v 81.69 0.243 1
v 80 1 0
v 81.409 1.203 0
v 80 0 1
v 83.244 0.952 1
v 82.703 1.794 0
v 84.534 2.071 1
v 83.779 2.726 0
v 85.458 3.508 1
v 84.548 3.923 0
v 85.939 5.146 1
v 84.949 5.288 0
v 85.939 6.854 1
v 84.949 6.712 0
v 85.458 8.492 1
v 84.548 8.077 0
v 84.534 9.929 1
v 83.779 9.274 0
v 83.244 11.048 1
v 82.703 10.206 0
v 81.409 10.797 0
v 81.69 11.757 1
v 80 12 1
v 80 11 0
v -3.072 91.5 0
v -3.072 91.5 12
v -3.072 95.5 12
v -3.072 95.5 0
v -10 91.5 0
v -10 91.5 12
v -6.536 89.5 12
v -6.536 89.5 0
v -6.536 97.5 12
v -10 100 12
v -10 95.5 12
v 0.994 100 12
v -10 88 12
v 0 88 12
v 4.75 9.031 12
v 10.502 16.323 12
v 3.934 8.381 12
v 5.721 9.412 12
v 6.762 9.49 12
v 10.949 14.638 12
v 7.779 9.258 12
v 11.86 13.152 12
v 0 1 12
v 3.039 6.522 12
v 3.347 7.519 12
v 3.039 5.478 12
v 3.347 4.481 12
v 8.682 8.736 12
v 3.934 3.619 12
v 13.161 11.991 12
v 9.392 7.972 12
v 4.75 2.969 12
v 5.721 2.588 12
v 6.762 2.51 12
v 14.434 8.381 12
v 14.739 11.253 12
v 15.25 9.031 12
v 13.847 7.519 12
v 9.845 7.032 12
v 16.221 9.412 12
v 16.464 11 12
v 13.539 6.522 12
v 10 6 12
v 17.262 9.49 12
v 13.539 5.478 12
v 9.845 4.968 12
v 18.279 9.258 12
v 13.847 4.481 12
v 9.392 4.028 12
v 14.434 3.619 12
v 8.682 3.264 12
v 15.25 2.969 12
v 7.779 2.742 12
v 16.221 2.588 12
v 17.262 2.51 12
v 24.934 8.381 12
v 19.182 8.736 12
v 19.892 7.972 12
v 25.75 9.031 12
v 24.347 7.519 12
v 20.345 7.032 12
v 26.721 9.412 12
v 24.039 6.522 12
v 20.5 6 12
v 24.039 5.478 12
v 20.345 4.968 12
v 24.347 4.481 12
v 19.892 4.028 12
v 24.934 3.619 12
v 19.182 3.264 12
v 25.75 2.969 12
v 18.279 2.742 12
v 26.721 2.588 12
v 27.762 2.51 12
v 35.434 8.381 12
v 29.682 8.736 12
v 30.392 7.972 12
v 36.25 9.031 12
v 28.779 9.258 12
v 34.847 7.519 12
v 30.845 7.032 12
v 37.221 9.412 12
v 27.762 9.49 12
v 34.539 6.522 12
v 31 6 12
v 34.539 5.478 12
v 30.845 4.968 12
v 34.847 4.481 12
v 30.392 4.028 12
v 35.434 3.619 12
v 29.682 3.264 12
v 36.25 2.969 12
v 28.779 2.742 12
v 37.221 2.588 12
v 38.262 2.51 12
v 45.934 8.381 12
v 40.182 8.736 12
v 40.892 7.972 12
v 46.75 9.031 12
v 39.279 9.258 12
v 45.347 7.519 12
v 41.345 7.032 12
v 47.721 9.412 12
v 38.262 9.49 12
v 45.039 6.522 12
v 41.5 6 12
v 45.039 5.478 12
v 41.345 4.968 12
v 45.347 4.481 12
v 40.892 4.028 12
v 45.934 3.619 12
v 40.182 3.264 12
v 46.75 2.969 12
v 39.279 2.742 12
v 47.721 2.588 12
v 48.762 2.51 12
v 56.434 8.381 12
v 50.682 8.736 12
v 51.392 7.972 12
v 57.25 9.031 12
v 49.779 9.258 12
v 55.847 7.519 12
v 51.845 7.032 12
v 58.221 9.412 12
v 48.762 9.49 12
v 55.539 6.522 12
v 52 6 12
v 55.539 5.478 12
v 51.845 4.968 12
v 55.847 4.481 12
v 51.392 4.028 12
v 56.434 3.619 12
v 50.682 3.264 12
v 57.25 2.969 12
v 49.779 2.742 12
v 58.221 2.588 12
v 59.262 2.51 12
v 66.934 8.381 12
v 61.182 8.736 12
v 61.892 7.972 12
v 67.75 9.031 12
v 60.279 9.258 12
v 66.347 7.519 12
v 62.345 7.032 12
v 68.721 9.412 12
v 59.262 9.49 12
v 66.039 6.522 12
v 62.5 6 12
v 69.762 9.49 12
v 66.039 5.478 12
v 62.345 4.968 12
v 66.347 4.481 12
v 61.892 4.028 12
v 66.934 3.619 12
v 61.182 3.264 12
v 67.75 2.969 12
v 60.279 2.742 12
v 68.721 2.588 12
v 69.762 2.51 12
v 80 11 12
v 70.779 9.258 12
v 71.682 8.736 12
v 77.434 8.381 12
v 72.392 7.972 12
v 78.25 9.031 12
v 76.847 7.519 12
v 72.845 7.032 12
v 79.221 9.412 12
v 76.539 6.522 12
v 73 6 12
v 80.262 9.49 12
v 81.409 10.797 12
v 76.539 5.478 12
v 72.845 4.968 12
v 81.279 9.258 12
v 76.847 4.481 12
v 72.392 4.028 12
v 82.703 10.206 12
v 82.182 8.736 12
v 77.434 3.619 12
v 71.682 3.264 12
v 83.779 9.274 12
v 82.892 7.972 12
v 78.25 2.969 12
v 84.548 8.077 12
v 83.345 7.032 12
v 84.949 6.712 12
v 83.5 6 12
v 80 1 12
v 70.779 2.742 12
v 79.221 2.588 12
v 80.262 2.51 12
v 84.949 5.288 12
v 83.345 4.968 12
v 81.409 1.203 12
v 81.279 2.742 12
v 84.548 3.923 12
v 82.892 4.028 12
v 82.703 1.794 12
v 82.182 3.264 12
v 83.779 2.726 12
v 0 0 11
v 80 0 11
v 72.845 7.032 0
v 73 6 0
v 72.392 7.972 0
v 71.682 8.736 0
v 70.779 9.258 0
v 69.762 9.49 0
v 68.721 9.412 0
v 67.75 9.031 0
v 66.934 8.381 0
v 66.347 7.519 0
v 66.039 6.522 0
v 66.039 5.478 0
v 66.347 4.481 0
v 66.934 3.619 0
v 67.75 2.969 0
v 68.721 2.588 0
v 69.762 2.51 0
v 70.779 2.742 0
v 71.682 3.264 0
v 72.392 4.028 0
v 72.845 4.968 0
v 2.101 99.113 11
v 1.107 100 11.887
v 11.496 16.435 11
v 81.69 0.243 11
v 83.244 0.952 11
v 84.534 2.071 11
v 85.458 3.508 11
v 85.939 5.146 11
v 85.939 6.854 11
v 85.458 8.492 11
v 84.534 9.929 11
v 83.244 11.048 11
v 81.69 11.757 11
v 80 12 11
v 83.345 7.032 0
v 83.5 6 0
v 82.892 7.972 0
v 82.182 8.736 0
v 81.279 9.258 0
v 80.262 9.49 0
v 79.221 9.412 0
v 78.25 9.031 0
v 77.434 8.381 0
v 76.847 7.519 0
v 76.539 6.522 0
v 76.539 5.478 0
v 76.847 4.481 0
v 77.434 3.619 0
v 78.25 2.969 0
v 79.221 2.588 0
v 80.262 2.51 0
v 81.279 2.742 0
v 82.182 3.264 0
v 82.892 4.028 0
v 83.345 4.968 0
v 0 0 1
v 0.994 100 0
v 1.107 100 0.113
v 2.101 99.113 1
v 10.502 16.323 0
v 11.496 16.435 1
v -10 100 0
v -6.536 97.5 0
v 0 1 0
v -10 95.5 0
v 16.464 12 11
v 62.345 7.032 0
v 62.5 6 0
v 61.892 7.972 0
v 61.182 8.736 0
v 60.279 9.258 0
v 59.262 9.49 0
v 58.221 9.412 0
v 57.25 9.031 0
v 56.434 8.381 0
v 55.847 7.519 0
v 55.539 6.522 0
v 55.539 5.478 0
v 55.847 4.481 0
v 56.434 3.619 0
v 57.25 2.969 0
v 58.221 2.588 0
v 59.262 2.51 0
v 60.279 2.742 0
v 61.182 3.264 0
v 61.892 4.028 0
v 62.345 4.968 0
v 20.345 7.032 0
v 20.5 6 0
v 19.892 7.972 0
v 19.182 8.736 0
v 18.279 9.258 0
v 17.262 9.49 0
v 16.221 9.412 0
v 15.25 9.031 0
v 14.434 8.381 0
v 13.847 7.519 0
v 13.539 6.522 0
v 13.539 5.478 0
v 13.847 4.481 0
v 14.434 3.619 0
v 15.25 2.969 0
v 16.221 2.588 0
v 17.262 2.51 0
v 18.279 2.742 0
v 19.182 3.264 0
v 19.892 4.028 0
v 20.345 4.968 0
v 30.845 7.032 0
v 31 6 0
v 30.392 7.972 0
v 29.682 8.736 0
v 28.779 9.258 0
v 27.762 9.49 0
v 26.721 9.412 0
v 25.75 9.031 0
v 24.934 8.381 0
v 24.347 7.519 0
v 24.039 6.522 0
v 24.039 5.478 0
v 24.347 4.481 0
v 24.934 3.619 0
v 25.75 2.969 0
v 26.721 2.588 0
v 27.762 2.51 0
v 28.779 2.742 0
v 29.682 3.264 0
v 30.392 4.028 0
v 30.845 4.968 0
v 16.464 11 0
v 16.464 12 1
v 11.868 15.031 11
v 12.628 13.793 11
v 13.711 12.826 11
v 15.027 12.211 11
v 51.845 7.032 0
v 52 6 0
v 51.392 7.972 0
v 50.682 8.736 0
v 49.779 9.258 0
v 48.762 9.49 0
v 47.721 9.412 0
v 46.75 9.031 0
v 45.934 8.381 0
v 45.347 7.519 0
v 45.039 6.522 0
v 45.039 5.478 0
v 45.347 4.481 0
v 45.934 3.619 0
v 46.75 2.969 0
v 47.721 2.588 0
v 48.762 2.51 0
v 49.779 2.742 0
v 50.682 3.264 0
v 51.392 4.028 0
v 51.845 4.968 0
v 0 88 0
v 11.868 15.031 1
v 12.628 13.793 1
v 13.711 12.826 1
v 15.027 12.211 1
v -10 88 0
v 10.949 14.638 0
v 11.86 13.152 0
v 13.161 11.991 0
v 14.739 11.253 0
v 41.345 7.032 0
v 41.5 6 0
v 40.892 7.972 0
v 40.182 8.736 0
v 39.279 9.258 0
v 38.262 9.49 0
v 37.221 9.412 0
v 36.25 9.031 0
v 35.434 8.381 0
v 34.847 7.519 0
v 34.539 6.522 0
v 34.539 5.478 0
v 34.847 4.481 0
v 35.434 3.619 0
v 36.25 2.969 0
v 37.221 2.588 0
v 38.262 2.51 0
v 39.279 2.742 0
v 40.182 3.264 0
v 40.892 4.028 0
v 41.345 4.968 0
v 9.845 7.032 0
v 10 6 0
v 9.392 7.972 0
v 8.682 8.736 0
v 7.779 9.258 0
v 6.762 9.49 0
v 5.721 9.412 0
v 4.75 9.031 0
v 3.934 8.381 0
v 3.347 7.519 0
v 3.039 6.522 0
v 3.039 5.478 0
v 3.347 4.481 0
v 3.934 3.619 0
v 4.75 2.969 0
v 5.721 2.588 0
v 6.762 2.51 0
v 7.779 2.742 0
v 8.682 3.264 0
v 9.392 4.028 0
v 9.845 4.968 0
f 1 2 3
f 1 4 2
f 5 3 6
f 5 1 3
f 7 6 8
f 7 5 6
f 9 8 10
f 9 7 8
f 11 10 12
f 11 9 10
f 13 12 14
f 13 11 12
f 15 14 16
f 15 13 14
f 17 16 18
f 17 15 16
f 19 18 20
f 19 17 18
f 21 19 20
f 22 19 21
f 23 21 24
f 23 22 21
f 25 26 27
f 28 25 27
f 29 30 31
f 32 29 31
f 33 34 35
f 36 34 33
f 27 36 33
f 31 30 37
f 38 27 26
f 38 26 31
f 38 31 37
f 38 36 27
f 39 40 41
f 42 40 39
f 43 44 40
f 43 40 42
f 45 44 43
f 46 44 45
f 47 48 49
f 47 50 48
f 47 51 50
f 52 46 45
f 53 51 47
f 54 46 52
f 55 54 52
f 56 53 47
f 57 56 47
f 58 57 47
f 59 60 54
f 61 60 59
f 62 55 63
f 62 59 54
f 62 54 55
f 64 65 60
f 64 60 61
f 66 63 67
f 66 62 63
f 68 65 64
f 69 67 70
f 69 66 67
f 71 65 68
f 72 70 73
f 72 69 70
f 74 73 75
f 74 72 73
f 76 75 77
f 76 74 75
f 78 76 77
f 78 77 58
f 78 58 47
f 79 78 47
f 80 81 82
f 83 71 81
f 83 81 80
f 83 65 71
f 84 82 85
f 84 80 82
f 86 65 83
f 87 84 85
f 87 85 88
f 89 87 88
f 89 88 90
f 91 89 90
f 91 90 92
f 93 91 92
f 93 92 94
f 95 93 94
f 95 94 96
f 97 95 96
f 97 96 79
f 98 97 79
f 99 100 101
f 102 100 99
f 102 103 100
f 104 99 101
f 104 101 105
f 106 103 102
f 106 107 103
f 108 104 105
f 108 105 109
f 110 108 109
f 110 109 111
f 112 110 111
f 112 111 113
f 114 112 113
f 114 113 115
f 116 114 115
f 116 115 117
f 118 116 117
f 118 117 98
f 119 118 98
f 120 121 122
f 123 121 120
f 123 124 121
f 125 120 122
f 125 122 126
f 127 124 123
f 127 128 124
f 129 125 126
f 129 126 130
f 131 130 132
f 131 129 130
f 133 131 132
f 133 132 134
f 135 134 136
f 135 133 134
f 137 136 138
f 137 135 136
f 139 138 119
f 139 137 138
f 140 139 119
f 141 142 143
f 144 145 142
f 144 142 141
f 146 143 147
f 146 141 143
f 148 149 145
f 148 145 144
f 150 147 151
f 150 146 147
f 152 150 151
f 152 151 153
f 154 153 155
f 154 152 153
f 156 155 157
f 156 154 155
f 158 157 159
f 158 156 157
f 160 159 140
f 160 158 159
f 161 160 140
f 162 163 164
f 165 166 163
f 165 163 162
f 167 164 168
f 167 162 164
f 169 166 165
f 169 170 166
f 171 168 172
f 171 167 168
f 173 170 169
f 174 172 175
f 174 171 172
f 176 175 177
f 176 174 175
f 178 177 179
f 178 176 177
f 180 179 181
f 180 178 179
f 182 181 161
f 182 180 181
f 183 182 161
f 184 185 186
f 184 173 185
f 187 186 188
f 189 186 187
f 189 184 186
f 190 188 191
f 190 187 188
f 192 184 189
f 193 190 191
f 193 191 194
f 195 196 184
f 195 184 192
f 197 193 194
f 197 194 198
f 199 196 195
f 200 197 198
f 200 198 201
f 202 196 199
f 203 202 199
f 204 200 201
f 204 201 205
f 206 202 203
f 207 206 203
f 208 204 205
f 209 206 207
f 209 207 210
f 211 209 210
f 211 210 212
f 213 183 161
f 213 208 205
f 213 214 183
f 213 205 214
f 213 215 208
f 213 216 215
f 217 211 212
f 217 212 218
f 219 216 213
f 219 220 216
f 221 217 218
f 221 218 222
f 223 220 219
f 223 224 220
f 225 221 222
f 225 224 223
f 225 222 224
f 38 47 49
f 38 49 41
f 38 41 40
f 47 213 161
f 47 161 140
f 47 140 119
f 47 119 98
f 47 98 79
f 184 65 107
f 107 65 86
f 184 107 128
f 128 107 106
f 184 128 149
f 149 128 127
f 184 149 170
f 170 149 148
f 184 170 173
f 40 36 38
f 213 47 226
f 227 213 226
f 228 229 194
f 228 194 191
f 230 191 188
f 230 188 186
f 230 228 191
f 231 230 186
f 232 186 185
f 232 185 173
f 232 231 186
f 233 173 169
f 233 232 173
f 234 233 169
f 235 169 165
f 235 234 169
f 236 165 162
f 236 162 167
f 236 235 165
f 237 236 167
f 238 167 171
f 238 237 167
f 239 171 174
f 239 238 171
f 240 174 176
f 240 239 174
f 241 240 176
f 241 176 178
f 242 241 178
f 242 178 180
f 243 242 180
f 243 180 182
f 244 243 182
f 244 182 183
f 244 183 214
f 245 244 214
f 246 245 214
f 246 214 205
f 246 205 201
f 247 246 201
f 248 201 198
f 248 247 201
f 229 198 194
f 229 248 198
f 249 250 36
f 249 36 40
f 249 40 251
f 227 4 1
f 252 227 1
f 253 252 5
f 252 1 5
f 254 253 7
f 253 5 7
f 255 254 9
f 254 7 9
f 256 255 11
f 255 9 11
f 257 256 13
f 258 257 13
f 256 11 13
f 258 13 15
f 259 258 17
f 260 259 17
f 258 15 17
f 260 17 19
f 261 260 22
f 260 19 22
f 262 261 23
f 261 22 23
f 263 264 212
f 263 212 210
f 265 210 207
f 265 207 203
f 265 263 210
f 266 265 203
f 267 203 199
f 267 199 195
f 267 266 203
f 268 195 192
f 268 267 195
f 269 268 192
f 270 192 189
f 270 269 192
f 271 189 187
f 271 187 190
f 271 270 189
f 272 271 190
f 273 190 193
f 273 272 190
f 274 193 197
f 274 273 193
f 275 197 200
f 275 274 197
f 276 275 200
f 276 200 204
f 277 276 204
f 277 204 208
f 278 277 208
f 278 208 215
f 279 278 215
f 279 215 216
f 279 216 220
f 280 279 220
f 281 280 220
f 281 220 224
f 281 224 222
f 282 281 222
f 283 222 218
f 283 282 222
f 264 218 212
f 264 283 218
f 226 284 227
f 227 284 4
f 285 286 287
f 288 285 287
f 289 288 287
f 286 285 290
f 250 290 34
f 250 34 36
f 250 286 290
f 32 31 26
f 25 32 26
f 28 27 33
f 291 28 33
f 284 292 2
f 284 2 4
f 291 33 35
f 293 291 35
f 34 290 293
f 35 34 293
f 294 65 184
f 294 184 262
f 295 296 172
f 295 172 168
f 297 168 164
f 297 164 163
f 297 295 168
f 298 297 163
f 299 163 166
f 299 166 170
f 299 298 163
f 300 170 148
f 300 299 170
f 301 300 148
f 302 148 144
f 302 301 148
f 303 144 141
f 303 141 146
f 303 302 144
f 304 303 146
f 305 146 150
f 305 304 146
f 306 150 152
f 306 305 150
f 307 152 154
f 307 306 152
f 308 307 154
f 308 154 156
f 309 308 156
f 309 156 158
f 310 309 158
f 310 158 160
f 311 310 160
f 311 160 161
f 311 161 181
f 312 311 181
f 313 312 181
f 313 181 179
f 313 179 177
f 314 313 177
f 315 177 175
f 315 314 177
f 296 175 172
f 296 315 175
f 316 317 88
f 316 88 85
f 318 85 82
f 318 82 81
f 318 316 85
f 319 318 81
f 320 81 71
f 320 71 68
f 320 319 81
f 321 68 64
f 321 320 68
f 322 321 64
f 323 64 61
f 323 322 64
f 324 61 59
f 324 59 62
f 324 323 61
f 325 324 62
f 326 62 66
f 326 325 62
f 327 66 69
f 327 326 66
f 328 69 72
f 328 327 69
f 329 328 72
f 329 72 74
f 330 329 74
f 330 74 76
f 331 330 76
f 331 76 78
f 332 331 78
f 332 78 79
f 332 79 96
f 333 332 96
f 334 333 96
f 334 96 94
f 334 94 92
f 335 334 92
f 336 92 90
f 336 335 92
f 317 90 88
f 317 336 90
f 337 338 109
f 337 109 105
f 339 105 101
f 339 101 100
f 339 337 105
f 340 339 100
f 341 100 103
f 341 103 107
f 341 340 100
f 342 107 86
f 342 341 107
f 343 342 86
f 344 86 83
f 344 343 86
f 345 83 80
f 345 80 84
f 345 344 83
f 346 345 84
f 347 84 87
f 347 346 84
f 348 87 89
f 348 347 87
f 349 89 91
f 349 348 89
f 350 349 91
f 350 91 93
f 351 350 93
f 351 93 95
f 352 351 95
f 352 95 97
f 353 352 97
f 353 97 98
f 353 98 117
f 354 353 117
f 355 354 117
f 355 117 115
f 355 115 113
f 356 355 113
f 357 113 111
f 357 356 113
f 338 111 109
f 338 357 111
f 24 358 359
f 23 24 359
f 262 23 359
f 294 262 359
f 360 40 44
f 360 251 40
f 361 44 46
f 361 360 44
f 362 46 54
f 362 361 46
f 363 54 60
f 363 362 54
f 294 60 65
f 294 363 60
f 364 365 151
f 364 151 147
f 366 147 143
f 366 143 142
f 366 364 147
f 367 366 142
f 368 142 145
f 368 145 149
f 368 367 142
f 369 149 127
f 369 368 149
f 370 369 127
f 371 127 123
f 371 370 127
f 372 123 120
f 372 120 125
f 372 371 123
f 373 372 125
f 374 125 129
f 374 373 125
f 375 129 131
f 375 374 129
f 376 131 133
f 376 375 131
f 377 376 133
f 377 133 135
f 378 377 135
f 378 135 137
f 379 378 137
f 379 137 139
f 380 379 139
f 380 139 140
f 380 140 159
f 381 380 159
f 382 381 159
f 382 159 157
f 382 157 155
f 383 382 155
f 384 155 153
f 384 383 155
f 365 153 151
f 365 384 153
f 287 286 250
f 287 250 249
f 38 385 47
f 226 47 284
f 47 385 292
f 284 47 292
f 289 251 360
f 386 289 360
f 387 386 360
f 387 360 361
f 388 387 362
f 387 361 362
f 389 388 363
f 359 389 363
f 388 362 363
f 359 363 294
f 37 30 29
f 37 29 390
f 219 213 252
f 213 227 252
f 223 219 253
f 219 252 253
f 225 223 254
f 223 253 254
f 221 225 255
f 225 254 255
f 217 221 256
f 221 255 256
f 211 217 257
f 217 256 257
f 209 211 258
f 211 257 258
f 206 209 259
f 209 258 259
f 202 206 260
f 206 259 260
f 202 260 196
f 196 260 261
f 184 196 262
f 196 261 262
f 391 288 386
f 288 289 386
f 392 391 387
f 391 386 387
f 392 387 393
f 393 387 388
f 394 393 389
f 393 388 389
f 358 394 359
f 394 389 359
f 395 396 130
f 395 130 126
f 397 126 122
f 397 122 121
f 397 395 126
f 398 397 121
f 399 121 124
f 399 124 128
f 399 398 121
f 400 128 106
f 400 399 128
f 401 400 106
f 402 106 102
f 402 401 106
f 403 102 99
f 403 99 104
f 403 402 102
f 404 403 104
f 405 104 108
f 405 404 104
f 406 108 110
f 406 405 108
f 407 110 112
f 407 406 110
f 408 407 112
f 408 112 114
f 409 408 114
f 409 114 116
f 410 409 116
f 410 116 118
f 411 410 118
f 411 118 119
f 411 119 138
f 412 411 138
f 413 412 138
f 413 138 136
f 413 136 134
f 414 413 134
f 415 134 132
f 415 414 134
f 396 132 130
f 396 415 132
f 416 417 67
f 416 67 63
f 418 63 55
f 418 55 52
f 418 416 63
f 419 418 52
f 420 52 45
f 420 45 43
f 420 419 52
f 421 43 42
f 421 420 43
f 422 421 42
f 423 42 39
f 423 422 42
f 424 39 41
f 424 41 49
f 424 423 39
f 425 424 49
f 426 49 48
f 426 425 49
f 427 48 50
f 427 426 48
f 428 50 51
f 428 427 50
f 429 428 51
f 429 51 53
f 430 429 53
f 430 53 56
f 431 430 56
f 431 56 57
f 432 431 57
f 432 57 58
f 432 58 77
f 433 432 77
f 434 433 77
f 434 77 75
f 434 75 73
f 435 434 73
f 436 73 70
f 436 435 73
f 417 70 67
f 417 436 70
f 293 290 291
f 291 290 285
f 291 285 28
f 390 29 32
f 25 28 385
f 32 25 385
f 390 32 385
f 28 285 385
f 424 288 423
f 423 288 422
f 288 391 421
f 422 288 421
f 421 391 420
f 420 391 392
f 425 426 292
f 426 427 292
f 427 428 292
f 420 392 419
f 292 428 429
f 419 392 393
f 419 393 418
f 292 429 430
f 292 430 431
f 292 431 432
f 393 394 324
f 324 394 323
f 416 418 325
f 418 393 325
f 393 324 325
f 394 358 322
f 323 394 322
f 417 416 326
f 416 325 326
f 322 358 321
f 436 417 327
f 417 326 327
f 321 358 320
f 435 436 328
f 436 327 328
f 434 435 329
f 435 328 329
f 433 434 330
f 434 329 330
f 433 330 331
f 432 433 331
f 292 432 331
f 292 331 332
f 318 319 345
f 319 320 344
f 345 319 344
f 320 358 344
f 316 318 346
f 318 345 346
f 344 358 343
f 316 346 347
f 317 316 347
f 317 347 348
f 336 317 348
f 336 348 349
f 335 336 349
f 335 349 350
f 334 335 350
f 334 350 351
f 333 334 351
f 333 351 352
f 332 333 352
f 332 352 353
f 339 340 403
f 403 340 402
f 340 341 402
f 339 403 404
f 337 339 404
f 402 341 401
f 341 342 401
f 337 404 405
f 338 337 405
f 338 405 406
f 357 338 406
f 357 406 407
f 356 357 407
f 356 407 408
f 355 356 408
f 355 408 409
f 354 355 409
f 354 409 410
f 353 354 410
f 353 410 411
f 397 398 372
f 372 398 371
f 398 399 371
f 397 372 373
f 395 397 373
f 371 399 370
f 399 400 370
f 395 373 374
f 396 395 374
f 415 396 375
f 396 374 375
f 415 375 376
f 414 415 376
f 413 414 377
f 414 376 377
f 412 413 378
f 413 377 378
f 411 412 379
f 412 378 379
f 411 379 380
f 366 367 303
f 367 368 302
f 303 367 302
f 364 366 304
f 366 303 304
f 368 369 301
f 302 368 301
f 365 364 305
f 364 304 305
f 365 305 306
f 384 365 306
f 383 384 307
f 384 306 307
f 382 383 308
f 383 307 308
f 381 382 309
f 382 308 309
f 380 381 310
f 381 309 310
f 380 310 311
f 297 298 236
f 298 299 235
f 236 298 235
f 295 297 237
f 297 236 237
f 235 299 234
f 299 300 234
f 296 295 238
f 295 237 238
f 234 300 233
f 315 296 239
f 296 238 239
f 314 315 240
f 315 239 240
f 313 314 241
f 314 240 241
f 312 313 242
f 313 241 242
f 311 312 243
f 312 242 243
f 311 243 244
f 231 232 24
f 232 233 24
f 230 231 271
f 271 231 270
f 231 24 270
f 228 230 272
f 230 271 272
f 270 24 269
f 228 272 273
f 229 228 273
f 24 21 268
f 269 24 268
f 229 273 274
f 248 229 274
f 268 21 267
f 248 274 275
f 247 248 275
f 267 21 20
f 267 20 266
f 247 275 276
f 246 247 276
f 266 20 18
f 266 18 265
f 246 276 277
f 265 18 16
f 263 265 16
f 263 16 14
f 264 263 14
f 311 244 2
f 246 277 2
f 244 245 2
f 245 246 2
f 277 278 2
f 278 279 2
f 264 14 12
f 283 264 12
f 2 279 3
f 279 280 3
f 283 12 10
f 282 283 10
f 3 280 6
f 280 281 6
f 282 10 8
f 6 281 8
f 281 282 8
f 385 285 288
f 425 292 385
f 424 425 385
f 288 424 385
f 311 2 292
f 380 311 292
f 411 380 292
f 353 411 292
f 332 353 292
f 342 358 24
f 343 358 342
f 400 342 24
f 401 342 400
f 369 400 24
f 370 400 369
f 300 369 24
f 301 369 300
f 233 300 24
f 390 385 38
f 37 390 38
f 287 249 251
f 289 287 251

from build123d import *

# Parameters (mm, degrees)
F0_R         = 3.5
F1_DEPTH     = 12
F3_DEPTH     = 25
F4_R         = 5
F5_W         = 12
F5_H         = 12
F6_DEPTH     = 10
F8_T1_DEPTH  = 86.6740446023
F8_T3_DEPTH  = 16.6151120325
F8_T5_DEPTH  = 82.571682988
F8_T7_DEPTH  = 63.5360023124
F8_T10_ANGLE = 180
F8_T12_ANGLE = 83.5169263071
F8_T14_ANGLE = 180
F8_T16_ANGLE = 83.5169263071
F9_DEPTH     = 25


# Not quite as in the source:
# - a fillet or chamfer that OpenCascade refuses, or shapes differently, is made with other operations: its cross-section is extruded or revolved along the edge and cut away or added


with BuildPart() as f1:
    # F0 (on Top) → F1 (new body)
    with BuildSketch(Plane.XY):
        with BuildLine():
            Line((12, 100), (0, 100))
            Line((0, 100), (0, 0))
            Line((0, 0), (80, 0))
            ThreePointArc((80, 0), (86, 6), (80, 12))
            Line((80, 12), (12, 12))
            Line((12, 12), (12, 100))
        make_face()
        with Locations((6.5, 6)):
            Circle(F0_R, mode=Mode.SUBTRACT)
        with Locations((17, 6)):
            Circle(F0_R, mode=Mode.SUBTRACT)
        with Locations((27.5, 6)):
            Circle(F0_R, mode=Mode.SUBTRACT)
        with Locations((38, 6)):
            Circle(F0_R, mode=Mode.SUBTRACT)
        with Locations((48.5, 6)):
            Circle(F0_R, mode=Mode.SUBTRACT)
        with Locations((59, 6)):
            Circle(F0_R, mode=Mode.SUBTRACT)
        with Locations((69.5, 6)):
            Circle(F0_R, mode=Mode.SUBTRACT)
        with Locations((80, 6)):
            Circle(F0_R, mode=Mode.SUBTRACT)
    extrude(amount=F1_DEPTH)

    # F2 (on face) → F3 (cut)
    with BuildSketch(Plane.XY.offset(12)):
        Polygon((2, 100), (12, 12), (12, 100), align=None)
    extrude(amount=-F3_DEPTH, mode=Mode.SUBTRACT)

    # F4
    f4_edges = [f1.edges().sort_by_distance(p)[0] for p in [
        (12, 12, 6),
    ]]
    fillet(f4_edges, radius=F4_R)

    # F5 (on face) → F6 (join)
    with BuildSketch(Plane(origin=(0, 0, 0), x_dir=(0, -1, 0), z_dir=(-1, 0, 0))):
        with Locations((-94, 6)):
            Rectangle(F5_W, F5_H)
    extrude(amount=F6_DEPTH)

    # F8: chamfer of 1 on 11 edges, made by hand

    # F8_s2 → F8_t1 (cut)
    with BuildSketch(Plane(origin=(-11.4836366644, 101.0560026464, 0), x_dir=(0, 0, 1), z_dir=(0.112909688, -0.9936052548, 0))):
        Polygon((12, -12.278179314), (11, -13.278179314), (12, -13.278179314), align=None)
        Polygon((0, -12.278179314), (1, -13.278179314), (0, -13.278179314), align=None)
    extrude(amount=F8_T1_DEPTH, mode=Mode.SUBTRACT)

    # F8_s4 → F8_t3 (cut)
    with BuildSketch(Plane.XY.offset(-2.3075560163)):
        Polygon((1.1072004625, 100), (2.1008057173, 99.112909688), (2, 100), align=None)
    extrude(amount=F8_T3_DEPTH, mode=Mode.SUBTRACT)

    # F8_s6 → F8_t5 (cut)
    with BuildSketch(Plane.YZ.offset(-2.571682988)):
        Polygon((1, 0), (0, 1), (0, 0), align=None)
        Polygon((1, 12), (0, 11), (0, 12), align=None)
    extrude(amount=F8_T5_DEPTH, mode=Mode.SUBTRACT)

    # F8_s8 → F8_t7 (cut)
    with BuildSketch(Plane.YZ.offset(16.4639976876)):
        Polygon((11, 0), (12, 1), (12, 0), align=None)
        Polygon((11, 12), (12, 11), (12, 12), align=None)
    extrude(amount=F8_T7_DEPTH, mode=Mode.SUBTRACT)

    # F8_s9 → F8_t10 (revolve, cut)
    with BuildSketch(Plane.YZ.offset(80)):
        Polygon((1, 0), (0, 1), (0, 0), align=None)
    revolve(axis=Axis((80, 6, 0), (0, 0, 1)), revolution_arc=F8_T10_ANGLE, mode=Mode.SUBTRACT)

    # F8_s11 → F8_t12 (revolve, cut)
    with BuildSketch(Plane(origin=(-1.6972973268, 14.9362164756, 0), x_dir=(0, 0, 1), z_dir=(-0.112909688, 0.9936052548, 0))):
        Polygon((0, 12.278179314), (1, 13.278179314), (0, 13.278179314), align=None)
    revolve(axis=Axis((16.4639976876, 17, 0), (0, 0, 1)), revolution_arc=F8_T12_ANGLE, mode=Mode.SUBTRACT)

    # F8_s13 → F8_t14 (revolve, cut)
    with BuildSketch(Plane.YZ.offset(80)):
        Polygon((1, 12), (0, 11), (0, 12), align=None)
    revolve(axis=Axis((80, 6, 12), (0, 0, 1)), revolution_arc=F8_T14_ANGLE, mode=Mode.SUBTRACT)

    # F8_s15 → F8_t16 (revolve, cut)
    with BuildSketch(Plane(origin=(-1.6972973268, 14.9362164756, 0), x_dir=(0, 0, 1), z_dir=(-0.112909688, 0.9936052548, 0))):
        Polygon((12, 12.278179314), (11, 13.278179314), (12, 13.278179314), align=None)
    revolve(axis=Axis((16.4639976876, 17, 12), (0, 0, 1)), revolution_arc=F8_T16_ANGLE, mode=Mode.SUBTRACT)

    # F7 (on face) → F9 (cut)
    with BuildSketch(Plane.XY.offset(12)):
        Polygon((150.627374606, 89.5), (150.627374606, 97.5), (143.6991713757, 101.5), (136.7709681454, 97.5), (136.7709681454, 89.5), (143.6991713757, 85.5), align=None)
        Polygon((-6.536, 89.5), (-3.0718983849, 91.5), (-3.0718983849, 95.5), (-6.536, 97.5), (-10.0001016151, 95.5), (-10.0001016151, 91.5), align=None)
    extrude(amount=-F9_DEPTH, mode=Mode.SUBTRACT)


solid = f1.part
